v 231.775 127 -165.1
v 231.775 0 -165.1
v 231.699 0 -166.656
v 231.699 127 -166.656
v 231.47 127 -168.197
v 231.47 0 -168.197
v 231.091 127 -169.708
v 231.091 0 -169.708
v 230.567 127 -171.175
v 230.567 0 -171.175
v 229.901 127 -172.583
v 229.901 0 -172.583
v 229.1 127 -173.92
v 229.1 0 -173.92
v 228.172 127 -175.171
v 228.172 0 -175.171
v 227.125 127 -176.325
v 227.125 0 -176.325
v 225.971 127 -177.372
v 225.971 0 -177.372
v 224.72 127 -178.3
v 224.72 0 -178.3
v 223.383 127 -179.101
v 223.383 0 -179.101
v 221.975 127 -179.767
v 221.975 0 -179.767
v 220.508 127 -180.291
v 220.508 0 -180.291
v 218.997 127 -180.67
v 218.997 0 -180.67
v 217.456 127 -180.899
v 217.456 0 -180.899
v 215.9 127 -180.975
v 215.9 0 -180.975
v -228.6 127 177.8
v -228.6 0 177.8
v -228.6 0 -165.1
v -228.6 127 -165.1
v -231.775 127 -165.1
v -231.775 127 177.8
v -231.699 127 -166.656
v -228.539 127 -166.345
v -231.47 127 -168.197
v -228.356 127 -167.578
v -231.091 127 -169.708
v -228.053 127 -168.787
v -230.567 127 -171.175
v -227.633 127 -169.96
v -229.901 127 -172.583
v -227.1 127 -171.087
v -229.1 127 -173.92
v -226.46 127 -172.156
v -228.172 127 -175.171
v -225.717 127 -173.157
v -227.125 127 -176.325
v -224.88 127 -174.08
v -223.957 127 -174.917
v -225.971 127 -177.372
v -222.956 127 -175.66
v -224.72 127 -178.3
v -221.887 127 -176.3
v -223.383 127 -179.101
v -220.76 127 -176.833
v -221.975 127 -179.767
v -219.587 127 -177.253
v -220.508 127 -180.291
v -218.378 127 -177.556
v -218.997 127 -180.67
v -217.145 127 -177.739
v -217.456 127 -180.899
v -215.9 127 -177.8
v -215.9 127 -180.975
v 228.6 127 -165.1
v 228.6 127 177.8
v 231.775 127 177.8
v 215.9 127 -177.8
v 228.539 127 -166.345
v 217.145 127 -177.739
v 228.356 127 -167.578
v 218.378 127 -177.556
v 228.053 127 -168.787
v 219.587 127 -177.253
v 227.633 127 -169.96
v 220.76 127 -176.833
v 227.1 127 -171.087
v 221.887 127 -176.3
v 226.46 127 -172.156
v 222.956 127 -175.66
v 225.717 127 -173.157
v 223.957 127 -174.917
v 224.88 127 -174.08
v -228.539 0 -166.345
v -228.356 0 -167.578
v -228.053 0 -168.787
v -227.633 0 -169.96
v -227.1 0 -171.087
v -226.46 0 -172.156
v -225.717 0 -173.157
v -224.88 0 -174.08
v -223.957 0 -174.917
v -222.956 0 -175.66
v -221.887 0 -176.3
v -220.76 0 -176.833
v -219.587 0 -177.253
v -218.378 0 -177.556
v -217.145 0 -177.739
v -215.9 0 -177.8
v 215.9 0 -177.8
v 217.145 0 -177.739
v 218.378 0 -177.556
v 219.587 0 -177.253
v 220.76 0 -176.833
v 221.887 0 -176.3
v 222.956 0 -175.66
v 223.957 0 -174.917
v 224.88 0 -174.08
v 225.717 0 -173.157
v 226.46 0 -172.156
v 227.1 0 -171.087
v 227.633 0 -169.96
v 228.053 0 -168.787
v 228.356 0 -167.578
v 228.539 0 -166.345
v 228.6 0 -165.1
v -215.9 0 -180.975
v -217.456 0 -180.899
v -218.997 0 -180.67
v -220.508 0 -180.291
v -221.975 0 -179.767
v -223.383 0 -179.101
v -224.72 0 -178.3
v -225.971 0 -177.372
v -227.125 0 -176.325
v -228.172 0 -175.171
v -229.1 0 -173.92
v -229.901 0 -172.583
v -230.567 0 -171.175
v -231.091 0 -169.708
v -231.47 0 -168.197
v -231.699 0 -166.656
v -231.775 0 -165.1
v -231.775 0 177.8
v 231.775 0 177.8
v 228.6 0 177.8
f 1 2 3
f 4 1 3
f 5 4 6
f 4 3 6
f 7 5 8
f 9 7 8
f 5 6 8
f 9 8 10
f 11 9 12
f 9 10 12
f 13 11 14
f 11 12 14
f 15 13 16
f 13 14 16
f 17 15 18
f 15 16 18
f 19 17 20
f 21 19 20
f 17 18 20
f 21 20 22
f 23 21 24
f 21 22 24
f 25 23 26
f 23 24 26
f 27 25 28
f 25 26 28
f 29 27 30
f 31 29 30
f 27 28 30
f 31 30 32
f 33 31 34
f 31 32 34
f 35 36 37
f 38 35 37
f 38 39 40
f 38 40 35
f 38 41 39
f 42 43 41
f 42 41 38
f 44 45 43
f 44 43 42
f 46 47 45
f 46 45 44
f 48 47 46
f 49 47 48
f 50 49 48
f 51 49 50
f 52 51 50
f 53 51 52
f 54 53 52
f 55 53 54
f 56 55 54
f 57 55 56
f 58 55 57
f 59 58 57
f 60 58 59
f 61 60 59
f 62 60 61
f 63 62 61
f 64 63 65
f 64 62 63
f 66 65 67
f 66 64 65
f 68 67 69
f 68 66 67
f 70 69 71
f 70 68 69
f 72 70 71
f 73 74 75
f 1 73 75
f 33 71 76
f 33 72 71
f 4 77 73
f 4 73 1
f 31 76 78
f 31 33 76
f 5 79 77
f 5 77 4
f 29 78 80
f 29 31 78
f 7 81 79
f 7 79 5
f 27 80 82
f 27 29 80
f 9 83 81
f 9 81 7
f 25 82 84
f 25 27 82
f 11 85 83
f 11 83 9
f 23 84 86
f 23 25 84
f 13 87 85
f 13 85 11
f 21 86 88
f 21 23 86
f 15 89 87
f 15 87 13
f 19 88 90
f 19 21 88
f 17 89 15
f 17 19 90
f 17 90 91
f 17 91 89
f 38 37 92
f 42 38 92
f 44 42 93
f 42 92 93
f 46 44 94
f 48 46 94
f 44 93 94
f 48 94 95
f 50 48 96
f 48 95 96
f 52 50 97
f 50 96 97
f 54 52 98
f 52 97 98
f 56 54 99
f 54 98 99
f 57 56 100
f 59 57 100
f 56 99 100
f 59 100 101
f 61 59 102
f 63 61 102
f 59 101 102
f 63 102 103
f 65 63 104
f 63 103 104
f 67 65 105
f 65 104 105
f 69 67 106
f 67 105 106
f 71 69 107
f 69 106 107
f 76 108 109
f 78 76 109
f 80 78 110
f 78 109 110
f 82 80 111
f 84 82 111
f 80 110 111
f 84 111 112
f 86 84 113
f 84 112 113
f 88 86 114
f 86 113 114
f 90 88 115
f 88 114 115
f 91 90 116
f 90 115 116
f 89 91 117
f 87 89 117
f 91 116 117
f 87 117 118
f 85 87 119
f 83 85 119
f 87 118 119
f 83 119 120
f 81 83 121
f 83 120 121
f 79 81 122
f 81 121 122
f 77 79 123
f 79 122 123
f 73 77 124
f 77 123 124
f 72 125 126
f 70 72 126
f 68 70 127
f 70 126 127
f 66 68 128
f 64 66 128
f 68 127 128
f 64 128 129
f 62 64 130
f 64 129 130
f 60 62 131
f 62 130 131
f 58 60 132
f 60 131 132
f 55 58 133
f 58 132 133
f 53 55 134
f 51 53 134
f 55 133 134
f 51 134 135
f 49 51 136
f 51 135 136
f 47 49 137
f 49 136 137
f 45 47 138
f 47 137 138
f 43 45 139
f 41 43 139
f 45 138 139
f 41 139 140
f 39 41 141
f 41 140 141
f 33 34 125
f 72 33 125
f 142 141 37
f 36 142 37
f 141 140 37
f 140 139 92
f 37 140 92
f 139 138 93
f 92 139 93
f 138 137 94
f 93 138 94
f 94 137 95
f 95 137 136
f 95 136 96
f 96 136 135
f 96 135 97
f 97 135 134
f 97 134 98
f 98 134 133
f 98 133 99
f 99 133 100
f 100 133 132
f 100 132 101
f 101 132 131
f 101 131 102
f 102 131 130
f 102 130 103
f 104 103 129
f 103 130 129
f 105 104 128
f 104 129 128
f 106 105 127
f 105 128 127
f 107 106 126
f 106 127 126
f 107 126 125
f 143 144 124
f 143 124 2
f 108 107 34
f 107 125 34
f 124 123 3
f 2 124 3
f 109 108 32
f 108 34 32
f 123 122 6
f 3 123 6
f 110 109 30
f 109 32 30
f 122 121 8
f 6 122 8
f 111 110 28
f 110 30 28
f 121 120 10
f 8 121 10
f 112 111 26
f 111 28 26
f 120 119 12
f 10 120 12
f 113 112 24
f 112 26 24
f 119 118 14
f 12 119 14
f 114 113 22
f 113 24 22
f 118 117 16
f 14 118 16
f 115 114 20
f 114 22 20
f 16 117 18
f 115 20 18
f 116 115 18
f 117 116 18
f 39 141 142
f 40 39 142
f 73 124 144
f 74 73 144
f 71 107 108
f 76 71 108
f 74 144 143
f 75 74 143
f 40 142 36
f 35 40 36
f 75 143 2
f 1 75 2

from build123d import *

# Parameters (mm, degrees)
BOSS_EXTRUDE1_DEPTH = 127


with BuildPart() as part:
    # Sketch1 → Boss-Extrude1 (new body)
    with BuildSketch(Plane(origin=(0, 0, 0), x_dir=(1, 0, 0), z_dir=(0, 1, 0))):
        with BuildLine():
            Line((-231.775, 165.1), (-231.775, -177.8))
            Line((-231.775, -177.8), (-228.6, -177.8))
            Line((-228.6, -177.8), (-228.6, 165.1))
            ThreePointArc((-228.6, 165.1), (-224.880256121, 174.080256121), (-215.9, 177.8))
            Line((-215.9, 177.8), (215.9, 177.8))
            ThreePointArc((215.9, 177.8), (224.880256121, 174.080256121), (228.6, 165.1))
            Line((228.6, 165.1), (228.6, -177.8))
            Line((228.6, -177.8), (231.775, -177.8))
            Line((231.775, -177.8), (231.775, 165.1))
            ThreePointArc((231.775, 165.1), (227.125320151, 176.325320151), (215.9, 180.975))
            Line((215.9, 180.975), (-215.9, 180.975))
            ThreePointArc((-215.9, 180.975), (-227.125320151, 176.325320151), (-231.775, 165.1))
        make_face()
    extrude(amount=BOSS_EXTRUDE1_DEPTH)


solid = part.part
